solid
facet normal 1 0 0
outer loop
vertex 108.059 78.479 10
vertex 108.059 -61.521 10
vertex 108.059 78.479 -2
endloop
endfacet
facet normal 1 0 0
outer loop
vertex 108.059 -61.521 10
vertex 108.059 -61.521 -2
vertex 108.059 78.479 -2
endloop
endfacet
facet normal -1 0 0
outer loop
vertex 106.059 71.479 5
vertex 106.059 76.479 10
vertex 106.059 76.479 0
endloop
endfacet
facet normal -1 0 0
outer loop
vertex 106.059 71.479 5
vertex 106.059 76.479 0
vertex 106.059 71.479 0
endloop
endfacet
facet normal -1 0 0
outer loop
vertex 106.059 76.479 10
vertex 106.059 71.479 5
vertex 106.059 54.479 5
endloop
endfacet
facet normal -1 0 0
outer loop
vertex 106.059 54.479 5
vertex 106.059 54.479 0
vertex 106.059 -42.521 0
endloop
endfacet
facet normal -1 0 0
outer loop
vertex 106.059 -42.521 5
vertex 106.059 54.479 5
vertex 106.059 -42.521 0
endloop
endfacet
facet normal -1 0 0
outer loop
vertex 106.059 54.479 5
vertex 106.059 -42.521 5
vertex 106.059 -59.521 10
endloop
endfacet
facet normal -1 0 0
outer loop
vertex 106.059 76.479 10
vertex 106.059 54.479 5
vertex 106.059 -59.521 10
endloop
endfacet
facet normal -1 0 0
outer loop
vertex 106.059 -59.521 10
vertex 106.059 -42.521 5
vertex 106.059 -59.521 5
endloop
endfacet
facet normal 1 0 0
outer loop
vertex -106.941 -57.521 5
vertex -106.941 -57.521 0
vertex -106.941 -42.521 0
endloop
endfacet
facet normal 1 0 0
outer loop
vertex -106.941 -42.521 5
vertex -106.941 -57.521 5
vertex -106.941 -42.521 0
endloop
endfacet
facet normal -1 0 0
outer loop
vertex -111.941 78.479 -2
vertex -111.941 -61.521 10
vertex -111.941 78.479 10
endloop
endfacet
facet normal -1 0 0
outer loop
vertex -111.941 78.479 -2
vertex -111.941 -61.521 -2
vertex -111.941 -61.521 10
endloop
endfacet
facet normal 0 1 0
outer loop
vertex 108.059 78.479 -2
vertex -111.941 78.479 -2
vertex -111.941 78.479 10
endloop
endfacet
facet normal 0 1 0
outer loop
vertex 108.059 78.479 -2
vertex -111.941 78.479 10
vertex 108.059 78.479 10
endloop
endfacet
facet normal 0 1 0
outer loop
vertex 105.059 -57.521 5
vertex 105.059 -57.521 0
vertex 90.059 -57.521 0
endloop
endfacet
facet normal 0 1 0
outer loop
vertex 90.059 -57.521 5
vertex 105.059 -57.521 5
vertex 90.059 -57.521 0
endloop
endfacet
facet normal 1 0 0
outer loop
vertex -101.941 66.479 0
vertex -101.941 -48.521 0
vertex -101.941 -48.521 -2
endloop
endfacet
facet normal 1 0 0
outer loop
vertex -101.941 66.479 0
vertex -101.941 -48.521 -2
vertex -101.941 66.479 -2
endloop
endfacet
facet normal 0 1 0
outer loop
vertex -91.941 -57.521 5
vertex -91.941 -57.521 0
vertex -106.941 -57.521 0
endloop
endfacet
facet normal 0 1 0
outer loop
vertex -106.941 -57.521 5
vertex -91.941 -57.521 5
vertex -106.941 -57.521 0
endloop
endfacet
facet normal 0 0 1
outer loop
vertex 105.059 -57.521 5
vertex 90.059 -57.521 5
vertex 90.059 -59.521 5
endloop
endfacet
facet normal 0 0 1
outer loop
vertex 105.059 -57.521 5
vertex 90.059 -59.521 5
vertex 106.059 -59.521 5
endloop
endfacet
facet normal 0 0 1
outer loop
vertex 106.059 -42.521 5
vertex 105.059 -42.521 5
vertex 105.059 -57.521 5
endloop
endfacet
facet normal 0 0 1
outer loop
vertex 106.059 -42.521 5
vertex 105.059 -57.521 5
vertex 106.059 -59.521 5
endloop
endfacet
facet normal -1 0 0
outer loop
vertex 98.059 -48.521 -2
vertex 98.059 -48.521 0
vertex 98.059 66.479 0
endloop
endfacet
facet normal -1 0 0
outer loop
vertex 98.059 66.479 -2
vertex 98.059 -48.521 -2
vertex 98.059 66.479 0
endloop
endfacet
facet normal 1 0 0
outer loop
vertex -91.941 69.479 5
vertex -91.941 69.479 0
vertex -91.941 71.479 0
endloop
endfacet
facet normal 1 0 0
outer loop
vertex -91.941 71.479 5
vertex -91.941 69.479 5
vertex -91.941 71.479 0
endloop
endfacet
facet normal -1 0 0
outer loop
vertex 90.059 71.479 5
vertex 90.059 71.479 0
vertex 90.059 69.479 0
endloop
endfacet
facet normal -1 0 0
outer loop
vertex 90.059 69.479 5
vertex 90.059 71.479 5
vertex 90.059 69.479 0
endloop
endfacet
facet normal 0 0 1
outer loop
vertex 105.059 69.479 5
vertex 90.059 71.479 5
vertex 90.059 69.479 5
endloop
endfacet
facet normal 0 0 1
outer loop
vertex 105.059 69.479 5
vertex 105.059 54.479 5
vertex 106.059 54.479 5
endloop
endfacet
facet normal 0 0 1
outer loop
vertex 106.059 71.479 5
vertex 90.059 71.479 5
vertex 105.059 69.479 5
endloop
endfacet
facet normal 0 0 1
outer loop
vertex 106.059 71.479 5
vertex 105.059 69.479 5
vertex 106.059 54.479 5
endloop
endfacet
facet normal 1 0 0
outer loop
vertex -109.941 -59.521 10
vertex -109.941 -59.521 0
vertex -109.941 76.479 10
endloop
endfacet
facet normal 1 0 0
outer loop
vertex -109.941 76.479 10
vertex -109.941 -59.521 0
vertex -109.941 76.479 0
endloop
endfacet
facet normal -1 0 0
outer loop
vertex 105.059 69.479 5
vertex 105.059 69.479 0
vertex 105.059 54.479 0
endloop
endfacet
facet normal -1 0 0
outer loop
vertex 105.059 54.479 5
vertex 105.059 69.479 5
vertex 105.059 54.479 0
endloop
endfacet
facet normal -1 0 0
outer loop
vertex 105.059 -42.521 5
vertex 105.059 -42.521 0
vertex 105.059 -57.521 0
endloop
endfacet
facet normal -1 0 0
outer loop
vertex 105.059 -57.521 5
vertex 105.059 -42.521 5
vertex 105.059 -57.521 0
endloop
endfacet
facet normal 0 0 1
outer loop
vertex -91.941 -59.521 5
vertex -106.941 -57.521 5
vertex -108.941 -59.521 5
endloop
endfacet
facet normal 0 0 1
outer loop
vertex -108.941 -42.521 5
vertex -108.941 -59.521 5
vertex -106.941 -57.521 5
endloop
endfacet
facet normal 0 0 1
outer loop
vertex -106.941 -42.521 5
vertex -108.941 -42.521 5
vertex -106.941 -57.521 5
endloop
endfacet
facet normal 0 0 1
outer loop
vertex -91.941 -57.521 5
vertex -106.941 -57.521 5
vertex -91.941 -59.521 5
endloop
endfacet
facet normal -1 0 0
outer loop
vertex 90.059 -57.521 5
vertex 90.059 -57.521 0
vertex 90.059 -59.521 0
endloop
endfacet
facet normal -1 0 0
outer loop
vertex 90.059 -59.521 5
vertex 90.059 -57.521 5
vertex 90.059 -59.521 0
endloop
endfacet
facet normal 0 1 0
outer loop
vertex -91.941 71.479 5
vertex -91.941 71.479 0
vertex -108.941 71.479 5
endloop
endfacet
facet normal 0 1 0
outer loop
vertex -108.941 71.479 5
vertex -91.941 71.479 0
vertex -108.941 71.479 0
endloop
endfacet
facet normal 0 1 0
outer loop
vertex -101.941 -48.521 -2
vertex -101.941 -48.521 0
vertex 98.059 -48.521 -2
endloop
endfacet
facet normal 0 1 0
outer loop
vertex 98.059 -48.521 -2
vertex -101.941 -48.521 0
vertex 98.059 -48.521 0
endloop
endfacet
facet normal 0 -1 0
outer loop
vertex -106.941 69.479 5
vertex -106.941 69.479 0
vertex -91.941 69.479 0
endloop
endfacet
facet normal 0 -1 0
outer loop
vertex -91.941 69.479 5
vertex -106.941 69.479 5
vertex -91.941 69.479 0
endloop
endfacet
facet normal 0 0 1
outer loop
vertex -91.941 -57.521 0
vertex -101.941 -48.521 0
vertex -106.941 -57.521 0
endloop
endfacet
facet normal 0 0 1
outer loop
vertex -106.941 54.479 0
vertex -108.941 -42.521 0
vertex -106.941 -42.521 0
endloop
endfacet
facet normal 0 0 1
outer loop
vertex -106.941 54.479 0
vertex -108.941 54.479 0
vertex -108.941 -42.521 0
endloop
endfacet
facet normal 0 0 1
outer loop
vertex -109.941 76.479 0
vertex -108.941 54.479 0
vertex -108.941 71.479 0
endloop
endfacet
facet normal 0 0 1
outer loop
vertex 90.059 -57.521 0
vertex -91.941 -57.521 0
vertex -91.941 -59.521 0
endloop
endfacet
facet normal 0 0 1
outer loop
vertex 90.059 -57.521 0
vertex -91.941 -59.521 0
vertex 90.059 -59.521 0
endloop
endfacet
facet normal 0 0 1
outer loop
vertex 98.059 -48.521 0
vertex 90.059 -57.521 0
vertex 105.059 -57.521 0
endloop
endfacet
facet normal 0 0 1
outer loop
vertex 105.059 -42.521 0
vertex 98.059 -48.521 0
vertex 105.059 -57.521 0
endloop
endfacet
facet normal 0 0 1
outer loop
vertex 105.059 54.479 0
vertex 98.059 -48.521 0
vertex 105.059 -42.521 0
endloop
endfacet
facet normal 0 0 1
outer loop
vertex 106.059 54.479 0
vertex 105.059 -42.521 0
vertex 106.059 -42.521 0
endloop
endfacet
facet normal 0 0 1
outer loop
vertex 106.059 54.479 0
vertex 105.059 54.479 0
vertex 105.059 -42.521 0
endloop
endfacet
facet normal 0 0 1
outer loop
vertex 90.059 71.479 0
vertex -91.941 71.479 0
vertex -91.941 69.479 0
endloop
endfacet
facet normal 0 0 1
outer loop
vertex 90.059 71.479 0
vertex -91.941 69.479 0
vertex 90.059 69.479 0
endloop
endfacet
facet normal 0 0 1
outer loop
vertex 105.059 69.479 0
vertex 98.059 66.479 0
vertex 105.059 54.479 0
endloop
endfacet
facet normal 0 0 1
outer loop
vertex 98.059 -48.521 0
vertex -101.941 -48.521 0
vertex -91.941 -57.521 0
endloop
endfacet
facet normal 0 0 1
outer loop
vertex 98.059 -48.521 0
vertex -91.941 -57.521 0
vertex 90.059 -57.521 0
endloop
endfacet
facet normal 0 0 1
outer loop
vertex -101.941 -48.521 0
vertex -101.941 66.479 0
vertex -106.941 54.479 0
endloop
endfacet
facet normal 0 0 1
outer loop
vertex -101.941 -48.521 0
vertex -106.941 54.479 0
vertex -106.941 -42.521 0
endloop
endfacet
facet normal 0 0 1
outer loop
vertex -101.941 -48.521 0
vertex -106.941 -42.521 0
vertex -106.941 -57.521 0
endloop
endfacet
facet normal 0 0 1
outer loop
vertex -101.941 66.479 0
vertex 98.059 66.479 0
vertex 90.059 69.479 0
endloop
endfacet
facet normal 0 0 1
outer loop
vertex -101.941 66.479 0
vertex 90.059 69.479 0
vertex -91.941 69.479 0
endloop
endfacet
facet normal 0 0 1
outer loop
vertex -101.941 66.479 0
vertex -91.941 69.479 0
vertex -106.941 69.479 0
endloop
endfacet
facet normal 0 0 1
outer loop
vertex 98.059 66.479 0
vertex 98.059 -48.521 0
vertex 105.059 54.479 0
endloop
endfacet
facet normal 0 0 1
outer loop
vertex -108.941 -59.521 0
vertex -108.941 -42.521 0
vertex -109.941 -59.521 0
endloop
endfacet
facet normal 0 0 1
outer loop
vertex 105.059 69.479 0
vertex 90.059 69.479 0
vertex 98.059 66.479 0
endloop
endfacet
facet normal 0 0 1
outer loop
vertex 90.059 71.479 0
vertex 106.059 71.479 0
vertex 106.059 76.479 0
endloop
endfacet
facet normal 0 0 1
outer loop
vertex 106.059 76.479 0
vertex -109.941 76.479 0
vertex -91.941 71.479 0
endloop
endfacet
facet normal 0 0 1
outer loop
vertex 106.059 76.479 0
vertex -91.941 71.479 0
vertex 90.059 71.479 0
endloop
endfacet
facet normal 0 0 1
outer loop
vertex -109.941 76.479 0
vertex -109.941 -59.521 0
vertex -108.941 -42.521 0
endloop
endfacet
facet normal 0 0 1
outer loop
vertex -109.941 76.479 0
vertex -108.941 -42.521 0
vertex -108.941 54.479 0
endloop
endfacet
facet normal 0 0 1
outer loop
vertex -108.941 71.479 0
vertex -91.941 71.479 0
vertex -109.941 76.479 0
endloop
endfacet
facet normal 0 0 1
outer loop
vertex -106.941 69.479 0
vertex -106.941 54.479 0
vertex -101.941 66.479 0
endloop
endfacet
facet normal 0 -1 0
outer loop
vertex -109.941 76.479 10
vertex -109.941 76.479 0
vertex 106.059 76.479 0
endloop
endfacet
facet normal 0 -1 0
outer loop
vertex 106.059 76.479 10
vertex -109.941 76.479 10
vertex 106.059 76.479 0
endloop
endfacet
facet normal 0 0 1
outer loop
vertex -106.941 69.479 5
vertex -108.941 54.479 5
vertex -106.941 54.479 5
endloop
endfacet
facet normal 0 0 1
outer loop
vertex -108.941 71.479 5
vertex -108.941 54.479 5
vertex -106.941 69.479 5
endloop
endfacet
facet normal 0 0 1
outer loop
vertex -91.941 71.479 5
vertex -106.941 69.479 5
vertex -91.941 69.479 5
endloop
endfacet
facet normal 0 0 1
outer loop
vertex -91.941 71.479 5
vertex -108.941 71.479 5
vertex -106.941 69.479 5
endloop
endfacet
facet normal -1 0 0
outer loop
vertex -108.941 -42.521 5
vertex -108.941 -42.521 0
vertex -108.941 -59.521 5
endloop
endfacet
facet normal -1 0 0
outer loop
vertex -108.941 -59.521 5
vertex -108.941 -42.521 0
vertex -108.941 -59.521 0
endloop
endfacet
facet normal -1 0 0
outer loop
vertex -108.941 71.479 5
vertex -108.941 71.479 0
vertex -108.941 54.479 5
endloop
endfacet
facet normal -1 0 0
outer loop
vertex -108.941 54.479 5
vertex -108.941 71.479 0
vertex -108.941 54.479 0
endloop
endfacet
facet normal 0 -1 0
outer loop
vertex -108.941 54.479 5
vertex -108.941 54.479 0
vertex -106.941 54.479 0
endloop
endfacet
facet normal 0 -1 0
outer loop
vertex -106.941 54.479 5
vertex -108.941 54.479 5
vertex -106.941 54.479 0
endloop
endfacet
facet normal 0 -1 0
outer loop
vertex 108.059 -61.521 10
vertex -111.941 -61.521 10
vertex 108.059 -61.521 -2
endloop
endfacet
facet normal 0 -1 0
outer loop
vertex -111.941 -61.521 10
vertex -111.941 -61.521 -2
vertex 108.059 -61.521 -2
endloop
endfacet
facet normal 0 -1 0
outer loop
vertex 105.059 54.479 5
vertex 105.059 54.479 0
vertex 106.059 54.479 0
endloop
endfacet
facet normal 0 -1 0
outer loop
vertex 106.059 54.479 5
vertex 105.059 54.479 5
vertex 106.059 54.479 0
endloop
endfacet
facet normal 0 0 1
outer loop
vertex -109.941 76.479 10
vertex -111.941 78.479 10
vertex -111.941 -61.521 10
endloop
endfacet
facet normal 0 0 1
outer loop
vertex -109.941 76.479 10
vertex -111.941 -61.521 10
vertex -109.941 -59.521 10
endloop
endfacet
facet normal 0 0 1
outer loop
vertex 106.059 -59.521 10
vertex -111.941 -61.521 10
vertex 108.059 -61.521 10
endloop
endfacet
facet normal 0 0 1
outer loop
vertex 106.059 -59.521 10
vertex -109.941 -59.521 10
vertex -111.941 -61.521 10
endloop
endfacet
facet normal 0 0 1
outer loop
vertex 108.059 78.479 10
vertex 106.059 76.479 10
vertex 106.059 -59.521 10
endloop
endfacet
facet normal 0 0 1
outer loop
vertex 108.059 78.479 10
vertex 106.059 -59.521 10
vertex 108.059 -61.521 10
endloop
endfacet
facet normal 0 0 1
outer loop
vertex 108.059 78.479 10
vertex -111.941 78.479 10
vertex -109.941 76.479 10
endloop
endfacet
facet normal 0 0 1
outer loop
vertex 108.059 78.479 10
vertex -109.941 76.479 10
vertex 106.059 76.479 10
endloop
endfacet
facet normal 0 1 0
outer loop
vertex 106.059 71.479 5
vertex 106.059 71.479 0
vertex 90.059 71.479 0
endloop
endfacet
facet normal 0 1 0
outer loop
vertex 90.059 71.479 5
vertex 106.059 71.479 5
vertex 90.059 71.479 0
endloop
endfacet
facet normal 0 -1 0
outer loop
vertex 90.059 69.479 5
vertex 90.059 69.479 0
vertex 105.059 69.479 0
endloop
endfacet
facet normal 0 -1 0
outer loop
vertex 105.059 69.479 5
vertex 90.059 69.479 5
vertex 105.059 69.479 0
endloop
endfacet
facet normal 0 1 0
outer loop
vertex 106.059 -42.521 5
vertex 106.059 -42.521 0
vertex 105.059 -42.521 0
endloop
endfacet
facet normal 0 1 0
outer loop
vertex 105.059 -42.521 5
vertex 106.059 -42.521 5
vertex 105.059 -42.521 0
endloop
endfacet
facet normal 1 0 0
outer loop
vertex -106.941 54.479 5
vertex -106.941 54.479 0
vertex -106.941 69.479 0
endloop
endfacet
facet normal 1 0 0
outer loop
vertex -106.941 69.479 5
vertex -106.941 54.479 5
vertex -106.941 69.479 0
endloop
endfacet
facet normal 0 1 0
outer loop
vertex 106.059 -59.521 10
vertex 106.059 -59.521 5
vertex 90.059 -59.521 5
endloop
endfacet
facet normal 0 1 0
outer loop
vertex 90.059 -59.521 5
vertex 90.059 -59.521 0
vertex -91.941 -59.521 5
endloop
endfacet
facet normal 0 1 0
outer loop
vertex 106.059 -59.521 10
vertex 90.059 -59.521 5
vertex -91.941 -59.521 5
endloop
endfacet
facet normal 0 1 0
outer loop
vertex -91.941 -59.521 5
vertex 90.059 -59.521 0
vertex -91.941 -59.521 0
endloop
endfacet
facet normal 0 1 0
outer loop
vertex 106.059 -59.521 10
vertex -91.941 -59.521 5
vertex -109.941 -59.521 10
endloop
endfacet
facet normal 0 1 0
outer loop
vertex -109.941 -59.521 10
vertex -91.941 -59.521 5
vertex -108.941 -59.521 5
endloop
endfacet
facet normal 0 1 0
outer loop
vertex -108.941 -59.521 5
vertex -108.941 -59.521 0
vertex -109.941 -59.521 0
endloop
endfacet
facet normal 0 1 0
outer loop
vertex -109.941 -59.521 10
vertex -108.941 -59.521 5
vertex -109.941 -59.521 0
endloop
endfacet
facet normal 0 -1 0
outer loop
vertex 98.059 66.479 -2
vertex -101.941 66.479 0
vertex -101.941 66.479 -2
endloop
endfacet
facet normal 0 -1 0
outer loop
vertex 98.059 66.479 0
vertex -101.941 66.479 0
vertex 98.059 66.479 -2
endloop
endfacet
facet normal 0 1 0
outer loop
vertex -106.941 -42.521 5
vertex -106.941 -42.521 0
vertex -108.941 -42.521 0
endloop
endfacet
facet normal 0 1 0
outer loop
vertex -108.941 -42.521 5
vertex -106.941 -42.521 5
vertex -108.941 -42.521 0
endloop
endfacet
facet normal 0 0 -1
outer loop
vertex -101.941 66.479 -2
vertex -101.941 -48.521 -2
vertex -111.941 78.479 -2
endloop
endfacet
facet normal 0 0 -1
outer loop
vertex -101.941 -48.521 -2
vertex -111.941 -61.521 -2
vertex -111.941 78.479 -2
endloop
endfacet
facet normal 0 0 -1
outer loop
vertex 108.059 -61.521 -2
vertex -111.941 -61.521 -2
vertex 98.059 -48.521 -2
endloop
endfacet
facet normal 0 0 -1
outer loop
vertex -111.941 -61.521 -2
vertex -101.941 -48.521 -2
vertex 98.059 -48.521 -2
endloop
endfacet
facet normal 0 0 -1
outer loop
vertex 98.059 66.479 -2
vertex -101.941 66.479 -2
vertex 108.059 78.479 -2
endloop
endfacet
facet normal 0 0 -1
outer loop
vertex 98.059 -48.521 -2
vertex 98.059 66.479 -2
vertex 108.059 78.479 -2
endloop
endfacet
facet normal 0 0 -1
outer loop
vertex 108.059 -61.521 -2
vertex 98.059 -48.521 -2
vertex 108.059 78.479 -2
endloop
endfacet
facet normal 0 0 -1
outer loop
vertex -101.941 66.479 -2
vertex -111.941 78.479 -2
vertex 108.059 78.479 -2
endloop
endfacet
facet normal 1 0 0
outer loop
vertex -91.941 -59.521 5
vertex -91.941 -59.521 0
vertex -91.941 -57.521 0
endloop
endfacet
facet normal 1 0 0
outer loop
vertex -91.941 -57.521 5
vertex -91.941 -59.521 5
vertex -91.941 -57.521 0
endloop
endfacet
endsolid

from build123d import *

# Parameters (mm, degrees)
F0_W     = 220
F0_H     = 140
F0_W_2   = 200
F0_H_2   = 115
F1_DEPTH = 2
F2_DEPTH = 5
F3_DEPTH = 10


with BuildPart() as f1:
    # F0 (on Top) → F1 (new body)
    with BuildSketch(Plane.XY):
        with Locations((-1.9406005144, 8.4791064262)):
            Rectangle(F0_W, F0_H)
        Polygon((106.0593994856, 76.4791064262), (106.0593994856, 71.4791064262), (107.0593994856, 71.4791064262), (107.0593994856, 69.4791064262), (107.0593994856, 54.4791064262), (106.0593994856, 54.4791064262), (106.0593994856, -42.5208935738), (107.0593994856, -42.5208935738), (107.0593994856, -57.5208935738), (107.0593994856, -59.5208935738), (106.0593994856, -59.5208935738), (105.0593994856, -59.5208935738), (90.0593994856, -59.5208935738), (-91.9406005144, -59.5208935738), (-106.9406005144, -59.5208935738), (-108.9406005144, -59.5208935738), (-109.9406005144, -59.5208935738), (-109.9406005144, 76.4791064262), align=None, mode=Mode.SUBTRACT)
        Polygon((90.0593994856, 69.4791064262), (90.0593994856, 71.4791064262), (105.0593994856, 71.4791064262), (106.0593994856, 71.4791064262), (106.0593994856, 76.4791064262), (-109.9406005144, 76.4791064262), (-109.9406005144, -59.5208935738), (-108.9406005144, -59.5208935738), (-108.9406005144, -57.5208935738), (-108.9406005144, -42.5208935738), (-106.9406005144, -42.5208935738), (-106.9406005144, -57.5208935738), (-91.9406005144, -57.5208935738), (-91.9406005144, -59.5208935738), (90.0593994856, -59.5208935738), (90.0593994856, -57.5208935738), (105.0593994856, -57.5208935738), (105.0593994856, -42.5208935738), (106.0593994856, -42.5208935738), (106.0593994856, 54.4791064262), (105.0593994856, 54.4791064262), (105.0593994856, 69.4791064262), align=None)
        Polygon((-106.9406005144, 54.4791064262), (-108.9406005144, 54.4791064262), (-108.9406005144, 69.4791064262), (-108.9406005144, 71.4791064262), (-106.9406005144, 71.4791064262), (-91.9406005144, 71.4791064262), (-91.9406005144, 69.4791064262), (-106.9406005144, 69.4791064262), align=None, mode=Mode.SUBTRACT)
        with Locations((-1.9406005144, 8.9791064262)):
            Rectangle(F0_W_2, F0_H_2, mode=Mode.SUBTRACT)
        Polygon((-108.9406005144, -57.5208935738), (-108.9406005144, -59.5208935738), (-106.9406005144, -59.5208935738), (-91.9406005144, -59.5208935738), (-91.9406005144, -57.5208935738), (-106.9406005144, -57.5208935738), (-106.9406005144, -42.5208935738), (-108.9406005144, -42.5208935738), align=None)
        Polygon((-108.9406005144, 69.4791064262), (-108.9406005144, 54.4791064262), (-106.9406005144, 54.4791064262), (-106.9406005144, 69.4791064262), (-91.9406005144, 69.4791064262), (-91.9406005144, 71.4791064262), (-106.9406005144, 71.4791064262), (-108.9406005144, 71.4791064262), align=None)
        Polygon((105.0593994856, 71.4791064262), (90.0593994856, 71.4791064262), (90.0593994856, 69.4791064262), (105.0593994856, 69.4791064262), (105.0593994856, 54.4791064262), (106.0593994856, 54.4791064262), (106.0593994856, 71.4791064262), align=None)
        Polygon((106.0593994856, -59.5208935738), (106.0593994856, -42.5208935738), (105.0593994856, -42.5208935738), (105.0593994856, -57.5208935738), (90.0593994856, -57.5208935738), (90.0593994856, -59.5208935738), (105.0593994856, -59.5208935738), align=None)
        Polygon((107.0593994856, 71.4791064262), (106.0593994856, 71.4791064262), (106.0593994856, 54.4791064262), (107.0593994856, 54.4791064262), (107.0593994856, 69.4791064262), align=None)
        Polygon((107.0593994856, -42.5208935738), (106.0593994856, -42.5208935738), (106.0593994856, -59.5208935738), (107.0593994856, -59.5208935738), (107.0593994856, -57.5208935738), align=None)
    extrude(amount=-F1_DEPTH)

    # F0 (on Top) → F2 (join)
    with BuildSketch(Plane.XY):
        Polygon((-108.9406005144, 69.4791064262), (-108.9406005144, 54.4791064262), (-106.9406005144, 54.4791064262), (-106.9406005144, 69.4791064262), (-91.9406005144, 69.4791064262), (-91.9406005144, 71.4791064262), (-106.9406005144, 71.4791064262), (-108.9406005144, 71.4791064262), align=None)
        Polygon((-108.9406005144, -57.5208935738), (-108.9406005144, -59.5208935738), (-106.9406005144, -59.5208935738), (-91.9406005144, -59.5208935738), (-91.9406005144, -57.5208935738), (-106.9406005144, -57.5208935738), (-106.9406005144, -42.5208935738), (-108.9406005144, -42.5208935738), align=None)
        Polygon((105.0593994856, 71.4791064262), (90.0593994856, 71.4791064262), (90.0593994856, 69.4791064262), (105.0593994856, 69.4791064262), (105.0593994856, 54.4791064262), (106.0593994856, 54.4791064262), (106.0593994856, 71.4791064262), align=None)
        Polygon((106.0593994856, -59.5208935738), (106.0593994856, -42.5208935738), (105.0593994856, -42.5208935738), (105.0593994856, -57.5208935738), (90.0593994856, -57.5208935738), (90.0593994856, -59.5208935738), (105.0593994856, -59.5208935738), align=None)
    extrude(amount=F2_DEPTH)

    # F0 (on Top) → F3 (join)
    with BuildSketch(Plane.XY):
        with Locations((-1.9406005144, 8.4791064262)):
            Rectangle(F0_W, F0_H)
        Polygon((106.0593994856, 76.4791064262), (106.0593994856, 71.4791064262), (107.0593994856, 71.4791064262), (107.0593994856, 69.4791064262), (107.0593994856, 54.4791064262), (106.0593994856, 54.4791064262), (106.0593994856, -42.5208935738), (107.0593994856, -42.5208935738), (107.0593994856, -57.5208935738), (107.0593994856, -59.5208935738), (106.0593994856, -59.5208935738), (105.0593994856, -59.5208935738), (90.0593994856, -59.5208935738), (-91.9406005144, -59.5208935738), (-106.9406005144, -59.5208935738), (-108.9406005144, -59.5208935738), (-109.9406005144, -59.5208935738), (-109.9406005144, 76.4791064262), align=None, mode=Mode.SUBTRACT)
        Polygon((107.0593994856, -42.5208935738), (106.0593994856, -42.5208935738), (106.0593994856, -59.5208935738), (107.0593994856, -59.5208935738), (107.0593994856, -57.5208935738), align=None)
        Polygon((107.0593994856, 71.4791064262), (106.0593994856, 71.4791064262), (106.0593994856, 54.4791064262), (107.0593994856, 54.4791064262), (107.0593994856, 69.4791064262), align=None)
    extrude(amount=F3_DEPTH)


solid = f1.part
